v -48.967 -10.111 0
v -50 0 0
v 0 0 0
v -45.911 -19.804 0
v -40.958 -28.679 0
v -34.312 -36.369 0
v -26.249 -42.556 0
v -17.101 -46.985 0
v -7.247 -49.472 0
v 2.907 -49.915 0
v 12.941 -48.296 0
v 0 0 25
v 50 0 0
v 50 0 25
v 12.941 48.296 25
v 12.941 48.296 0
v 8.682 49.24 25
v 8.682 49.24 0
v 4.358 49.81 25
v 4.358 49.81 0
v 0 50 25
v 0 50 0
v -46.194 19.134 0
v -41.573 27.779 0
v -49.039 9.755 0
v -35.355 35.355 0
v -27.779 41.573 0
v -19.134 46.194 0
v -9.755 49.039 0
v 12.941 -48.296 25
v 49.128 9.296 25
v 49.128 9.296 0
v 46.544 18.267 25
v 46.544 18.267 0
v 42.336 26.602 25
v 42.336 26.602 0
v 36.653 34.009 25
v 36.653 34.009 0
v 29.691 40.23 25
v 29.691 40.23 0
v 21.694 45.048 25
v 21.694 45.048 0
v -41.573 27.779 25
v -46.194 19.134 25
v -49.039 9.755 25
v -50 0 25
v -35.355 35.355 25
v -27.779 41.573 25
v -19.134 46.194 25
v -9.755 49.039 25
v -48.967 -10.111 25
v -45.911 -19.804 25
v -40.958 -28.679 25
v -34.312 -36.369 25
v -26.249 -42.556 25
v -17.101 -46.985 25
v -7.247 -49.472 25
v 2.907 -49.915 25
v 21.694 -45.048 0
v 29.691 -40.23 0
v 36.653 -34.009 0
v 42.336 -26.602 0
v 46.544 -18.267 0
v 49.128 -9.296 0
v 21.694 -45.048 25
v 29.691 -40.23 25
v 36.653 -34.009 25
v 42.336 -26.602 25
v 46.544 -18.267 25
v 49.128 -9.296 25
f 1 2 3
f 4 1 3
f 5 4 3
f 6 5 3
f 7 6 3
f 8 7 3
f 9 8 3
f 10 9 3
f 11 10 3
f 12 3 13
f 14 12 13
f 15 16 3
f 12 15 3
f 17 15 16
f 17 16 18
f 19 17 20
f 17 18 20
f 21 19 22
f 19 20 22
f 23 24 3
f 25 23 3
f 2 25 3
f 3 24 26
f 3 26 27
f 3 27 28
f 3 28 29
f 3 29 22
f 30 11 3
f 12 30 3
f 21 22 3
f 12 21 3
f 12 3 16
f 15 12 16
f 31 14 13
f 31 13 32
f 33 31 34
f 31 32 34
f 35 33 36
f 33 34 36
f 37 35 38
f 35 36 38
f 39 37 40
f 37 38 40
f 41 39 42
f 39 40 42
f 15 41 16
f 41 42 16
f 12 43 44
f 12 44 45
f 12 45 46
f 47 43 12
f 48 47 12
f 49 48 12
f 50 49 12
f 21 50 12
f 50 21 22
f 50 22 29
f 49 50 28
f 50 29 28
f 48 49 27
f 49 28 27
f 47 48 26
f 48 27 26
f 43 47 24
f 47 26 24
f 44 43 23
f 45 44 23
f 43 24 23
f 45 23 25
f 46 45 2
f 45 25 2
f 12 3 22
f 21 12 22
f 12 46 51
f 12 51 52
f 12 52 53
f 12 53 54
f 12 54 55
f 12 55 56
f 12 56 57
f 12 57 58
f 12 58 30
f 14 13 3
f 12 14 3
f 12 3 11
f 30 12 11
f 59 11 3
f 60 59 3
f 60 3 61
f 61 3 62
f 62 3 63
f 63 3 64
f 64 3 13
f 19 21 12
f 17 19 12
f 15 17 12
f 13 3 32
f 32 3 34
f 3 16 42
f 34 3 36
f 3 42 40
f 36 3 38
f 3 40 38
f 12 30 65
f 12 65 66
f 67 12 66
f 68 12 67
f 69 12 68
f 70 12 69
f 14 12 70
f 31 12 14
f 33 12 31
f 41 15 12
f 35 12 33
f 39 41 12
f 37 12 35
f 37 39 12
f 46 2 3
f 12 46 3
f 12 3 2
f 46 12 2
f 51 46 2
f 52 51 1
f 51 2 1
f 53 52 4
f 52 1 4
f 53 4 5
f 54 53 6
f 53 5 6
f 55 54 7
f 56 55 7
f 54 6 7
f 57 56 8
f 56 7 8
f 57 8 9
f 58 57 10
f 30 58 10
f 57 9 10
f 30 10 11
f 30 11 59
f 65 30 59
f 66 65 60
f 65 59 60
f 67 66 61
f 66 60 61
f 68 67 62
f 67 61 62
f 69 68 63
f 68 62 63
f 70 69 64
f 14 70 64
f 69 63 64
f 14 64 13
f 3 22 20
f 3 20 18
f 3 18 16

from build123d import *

# Parameters (mm, degrees)
F1_DEPTH = 25
F2_DEPTH = 25
F3_DEPTH = 25


with BuildPart() as f1:
    # F0 (on Top) → F1 (new body)
    with BuildSketch(Plane.XY):
        with BuildLine():
            Line((0, 0), (12.940952, 48.296291))
            ThreePointArc((12.940952, 48.296291), (6.52631, 49.572243), (0, 50))
            Line((0, 50), (0, 0))
        make_face()
        with BuildLine():
            ThreePointArc((12.940952, -48.296291), (39.667667, -30.438071), (50, 0))
            Line((50, 0), (0, 0))
            Line((0, 0), (12.940952, -48.296291))
        make_face()
    extrude(amount=F1_DEPTH)


with BuildPart() as f2:
    # F0 (on Top) → F2 (new body)
    with BuildSketch(Plane.XY):
        with BuildLine():
            Line((0, 0), (50, 0))
            ThreePointArc((50, 0), (39.667667, 30.438071), (12.940952, 48.296291))
            Line((12.940952, 48.296291), (0, 0))
        make_face()
        with BuildLine():
            ThreePointArc((-50, 0), (-30.438071, -39.667667), (12.940952, -48.296291))
            Line((12.940952, -48.296291), (0, 0))
            Line((0, 0), (-50, 0))
        make_face()
    extrude(amount=F2_DEPTH)


with BuildPart() as f3:
    # F0 (on Top) → F3 (new body)
    with BuildSketch(Plane.XY):
        with BuildLine():
            Line((-50, 0), (0, 0))
            Line((0, 0), (0, 50))
            ThreePointArc((0, 50), (-35.355339, 35.355339), (-50, 0))
        make_face()
    extrude(amount=F3_DEPTH)


solid = Compound([f1.part, f2.part, f3.part])
